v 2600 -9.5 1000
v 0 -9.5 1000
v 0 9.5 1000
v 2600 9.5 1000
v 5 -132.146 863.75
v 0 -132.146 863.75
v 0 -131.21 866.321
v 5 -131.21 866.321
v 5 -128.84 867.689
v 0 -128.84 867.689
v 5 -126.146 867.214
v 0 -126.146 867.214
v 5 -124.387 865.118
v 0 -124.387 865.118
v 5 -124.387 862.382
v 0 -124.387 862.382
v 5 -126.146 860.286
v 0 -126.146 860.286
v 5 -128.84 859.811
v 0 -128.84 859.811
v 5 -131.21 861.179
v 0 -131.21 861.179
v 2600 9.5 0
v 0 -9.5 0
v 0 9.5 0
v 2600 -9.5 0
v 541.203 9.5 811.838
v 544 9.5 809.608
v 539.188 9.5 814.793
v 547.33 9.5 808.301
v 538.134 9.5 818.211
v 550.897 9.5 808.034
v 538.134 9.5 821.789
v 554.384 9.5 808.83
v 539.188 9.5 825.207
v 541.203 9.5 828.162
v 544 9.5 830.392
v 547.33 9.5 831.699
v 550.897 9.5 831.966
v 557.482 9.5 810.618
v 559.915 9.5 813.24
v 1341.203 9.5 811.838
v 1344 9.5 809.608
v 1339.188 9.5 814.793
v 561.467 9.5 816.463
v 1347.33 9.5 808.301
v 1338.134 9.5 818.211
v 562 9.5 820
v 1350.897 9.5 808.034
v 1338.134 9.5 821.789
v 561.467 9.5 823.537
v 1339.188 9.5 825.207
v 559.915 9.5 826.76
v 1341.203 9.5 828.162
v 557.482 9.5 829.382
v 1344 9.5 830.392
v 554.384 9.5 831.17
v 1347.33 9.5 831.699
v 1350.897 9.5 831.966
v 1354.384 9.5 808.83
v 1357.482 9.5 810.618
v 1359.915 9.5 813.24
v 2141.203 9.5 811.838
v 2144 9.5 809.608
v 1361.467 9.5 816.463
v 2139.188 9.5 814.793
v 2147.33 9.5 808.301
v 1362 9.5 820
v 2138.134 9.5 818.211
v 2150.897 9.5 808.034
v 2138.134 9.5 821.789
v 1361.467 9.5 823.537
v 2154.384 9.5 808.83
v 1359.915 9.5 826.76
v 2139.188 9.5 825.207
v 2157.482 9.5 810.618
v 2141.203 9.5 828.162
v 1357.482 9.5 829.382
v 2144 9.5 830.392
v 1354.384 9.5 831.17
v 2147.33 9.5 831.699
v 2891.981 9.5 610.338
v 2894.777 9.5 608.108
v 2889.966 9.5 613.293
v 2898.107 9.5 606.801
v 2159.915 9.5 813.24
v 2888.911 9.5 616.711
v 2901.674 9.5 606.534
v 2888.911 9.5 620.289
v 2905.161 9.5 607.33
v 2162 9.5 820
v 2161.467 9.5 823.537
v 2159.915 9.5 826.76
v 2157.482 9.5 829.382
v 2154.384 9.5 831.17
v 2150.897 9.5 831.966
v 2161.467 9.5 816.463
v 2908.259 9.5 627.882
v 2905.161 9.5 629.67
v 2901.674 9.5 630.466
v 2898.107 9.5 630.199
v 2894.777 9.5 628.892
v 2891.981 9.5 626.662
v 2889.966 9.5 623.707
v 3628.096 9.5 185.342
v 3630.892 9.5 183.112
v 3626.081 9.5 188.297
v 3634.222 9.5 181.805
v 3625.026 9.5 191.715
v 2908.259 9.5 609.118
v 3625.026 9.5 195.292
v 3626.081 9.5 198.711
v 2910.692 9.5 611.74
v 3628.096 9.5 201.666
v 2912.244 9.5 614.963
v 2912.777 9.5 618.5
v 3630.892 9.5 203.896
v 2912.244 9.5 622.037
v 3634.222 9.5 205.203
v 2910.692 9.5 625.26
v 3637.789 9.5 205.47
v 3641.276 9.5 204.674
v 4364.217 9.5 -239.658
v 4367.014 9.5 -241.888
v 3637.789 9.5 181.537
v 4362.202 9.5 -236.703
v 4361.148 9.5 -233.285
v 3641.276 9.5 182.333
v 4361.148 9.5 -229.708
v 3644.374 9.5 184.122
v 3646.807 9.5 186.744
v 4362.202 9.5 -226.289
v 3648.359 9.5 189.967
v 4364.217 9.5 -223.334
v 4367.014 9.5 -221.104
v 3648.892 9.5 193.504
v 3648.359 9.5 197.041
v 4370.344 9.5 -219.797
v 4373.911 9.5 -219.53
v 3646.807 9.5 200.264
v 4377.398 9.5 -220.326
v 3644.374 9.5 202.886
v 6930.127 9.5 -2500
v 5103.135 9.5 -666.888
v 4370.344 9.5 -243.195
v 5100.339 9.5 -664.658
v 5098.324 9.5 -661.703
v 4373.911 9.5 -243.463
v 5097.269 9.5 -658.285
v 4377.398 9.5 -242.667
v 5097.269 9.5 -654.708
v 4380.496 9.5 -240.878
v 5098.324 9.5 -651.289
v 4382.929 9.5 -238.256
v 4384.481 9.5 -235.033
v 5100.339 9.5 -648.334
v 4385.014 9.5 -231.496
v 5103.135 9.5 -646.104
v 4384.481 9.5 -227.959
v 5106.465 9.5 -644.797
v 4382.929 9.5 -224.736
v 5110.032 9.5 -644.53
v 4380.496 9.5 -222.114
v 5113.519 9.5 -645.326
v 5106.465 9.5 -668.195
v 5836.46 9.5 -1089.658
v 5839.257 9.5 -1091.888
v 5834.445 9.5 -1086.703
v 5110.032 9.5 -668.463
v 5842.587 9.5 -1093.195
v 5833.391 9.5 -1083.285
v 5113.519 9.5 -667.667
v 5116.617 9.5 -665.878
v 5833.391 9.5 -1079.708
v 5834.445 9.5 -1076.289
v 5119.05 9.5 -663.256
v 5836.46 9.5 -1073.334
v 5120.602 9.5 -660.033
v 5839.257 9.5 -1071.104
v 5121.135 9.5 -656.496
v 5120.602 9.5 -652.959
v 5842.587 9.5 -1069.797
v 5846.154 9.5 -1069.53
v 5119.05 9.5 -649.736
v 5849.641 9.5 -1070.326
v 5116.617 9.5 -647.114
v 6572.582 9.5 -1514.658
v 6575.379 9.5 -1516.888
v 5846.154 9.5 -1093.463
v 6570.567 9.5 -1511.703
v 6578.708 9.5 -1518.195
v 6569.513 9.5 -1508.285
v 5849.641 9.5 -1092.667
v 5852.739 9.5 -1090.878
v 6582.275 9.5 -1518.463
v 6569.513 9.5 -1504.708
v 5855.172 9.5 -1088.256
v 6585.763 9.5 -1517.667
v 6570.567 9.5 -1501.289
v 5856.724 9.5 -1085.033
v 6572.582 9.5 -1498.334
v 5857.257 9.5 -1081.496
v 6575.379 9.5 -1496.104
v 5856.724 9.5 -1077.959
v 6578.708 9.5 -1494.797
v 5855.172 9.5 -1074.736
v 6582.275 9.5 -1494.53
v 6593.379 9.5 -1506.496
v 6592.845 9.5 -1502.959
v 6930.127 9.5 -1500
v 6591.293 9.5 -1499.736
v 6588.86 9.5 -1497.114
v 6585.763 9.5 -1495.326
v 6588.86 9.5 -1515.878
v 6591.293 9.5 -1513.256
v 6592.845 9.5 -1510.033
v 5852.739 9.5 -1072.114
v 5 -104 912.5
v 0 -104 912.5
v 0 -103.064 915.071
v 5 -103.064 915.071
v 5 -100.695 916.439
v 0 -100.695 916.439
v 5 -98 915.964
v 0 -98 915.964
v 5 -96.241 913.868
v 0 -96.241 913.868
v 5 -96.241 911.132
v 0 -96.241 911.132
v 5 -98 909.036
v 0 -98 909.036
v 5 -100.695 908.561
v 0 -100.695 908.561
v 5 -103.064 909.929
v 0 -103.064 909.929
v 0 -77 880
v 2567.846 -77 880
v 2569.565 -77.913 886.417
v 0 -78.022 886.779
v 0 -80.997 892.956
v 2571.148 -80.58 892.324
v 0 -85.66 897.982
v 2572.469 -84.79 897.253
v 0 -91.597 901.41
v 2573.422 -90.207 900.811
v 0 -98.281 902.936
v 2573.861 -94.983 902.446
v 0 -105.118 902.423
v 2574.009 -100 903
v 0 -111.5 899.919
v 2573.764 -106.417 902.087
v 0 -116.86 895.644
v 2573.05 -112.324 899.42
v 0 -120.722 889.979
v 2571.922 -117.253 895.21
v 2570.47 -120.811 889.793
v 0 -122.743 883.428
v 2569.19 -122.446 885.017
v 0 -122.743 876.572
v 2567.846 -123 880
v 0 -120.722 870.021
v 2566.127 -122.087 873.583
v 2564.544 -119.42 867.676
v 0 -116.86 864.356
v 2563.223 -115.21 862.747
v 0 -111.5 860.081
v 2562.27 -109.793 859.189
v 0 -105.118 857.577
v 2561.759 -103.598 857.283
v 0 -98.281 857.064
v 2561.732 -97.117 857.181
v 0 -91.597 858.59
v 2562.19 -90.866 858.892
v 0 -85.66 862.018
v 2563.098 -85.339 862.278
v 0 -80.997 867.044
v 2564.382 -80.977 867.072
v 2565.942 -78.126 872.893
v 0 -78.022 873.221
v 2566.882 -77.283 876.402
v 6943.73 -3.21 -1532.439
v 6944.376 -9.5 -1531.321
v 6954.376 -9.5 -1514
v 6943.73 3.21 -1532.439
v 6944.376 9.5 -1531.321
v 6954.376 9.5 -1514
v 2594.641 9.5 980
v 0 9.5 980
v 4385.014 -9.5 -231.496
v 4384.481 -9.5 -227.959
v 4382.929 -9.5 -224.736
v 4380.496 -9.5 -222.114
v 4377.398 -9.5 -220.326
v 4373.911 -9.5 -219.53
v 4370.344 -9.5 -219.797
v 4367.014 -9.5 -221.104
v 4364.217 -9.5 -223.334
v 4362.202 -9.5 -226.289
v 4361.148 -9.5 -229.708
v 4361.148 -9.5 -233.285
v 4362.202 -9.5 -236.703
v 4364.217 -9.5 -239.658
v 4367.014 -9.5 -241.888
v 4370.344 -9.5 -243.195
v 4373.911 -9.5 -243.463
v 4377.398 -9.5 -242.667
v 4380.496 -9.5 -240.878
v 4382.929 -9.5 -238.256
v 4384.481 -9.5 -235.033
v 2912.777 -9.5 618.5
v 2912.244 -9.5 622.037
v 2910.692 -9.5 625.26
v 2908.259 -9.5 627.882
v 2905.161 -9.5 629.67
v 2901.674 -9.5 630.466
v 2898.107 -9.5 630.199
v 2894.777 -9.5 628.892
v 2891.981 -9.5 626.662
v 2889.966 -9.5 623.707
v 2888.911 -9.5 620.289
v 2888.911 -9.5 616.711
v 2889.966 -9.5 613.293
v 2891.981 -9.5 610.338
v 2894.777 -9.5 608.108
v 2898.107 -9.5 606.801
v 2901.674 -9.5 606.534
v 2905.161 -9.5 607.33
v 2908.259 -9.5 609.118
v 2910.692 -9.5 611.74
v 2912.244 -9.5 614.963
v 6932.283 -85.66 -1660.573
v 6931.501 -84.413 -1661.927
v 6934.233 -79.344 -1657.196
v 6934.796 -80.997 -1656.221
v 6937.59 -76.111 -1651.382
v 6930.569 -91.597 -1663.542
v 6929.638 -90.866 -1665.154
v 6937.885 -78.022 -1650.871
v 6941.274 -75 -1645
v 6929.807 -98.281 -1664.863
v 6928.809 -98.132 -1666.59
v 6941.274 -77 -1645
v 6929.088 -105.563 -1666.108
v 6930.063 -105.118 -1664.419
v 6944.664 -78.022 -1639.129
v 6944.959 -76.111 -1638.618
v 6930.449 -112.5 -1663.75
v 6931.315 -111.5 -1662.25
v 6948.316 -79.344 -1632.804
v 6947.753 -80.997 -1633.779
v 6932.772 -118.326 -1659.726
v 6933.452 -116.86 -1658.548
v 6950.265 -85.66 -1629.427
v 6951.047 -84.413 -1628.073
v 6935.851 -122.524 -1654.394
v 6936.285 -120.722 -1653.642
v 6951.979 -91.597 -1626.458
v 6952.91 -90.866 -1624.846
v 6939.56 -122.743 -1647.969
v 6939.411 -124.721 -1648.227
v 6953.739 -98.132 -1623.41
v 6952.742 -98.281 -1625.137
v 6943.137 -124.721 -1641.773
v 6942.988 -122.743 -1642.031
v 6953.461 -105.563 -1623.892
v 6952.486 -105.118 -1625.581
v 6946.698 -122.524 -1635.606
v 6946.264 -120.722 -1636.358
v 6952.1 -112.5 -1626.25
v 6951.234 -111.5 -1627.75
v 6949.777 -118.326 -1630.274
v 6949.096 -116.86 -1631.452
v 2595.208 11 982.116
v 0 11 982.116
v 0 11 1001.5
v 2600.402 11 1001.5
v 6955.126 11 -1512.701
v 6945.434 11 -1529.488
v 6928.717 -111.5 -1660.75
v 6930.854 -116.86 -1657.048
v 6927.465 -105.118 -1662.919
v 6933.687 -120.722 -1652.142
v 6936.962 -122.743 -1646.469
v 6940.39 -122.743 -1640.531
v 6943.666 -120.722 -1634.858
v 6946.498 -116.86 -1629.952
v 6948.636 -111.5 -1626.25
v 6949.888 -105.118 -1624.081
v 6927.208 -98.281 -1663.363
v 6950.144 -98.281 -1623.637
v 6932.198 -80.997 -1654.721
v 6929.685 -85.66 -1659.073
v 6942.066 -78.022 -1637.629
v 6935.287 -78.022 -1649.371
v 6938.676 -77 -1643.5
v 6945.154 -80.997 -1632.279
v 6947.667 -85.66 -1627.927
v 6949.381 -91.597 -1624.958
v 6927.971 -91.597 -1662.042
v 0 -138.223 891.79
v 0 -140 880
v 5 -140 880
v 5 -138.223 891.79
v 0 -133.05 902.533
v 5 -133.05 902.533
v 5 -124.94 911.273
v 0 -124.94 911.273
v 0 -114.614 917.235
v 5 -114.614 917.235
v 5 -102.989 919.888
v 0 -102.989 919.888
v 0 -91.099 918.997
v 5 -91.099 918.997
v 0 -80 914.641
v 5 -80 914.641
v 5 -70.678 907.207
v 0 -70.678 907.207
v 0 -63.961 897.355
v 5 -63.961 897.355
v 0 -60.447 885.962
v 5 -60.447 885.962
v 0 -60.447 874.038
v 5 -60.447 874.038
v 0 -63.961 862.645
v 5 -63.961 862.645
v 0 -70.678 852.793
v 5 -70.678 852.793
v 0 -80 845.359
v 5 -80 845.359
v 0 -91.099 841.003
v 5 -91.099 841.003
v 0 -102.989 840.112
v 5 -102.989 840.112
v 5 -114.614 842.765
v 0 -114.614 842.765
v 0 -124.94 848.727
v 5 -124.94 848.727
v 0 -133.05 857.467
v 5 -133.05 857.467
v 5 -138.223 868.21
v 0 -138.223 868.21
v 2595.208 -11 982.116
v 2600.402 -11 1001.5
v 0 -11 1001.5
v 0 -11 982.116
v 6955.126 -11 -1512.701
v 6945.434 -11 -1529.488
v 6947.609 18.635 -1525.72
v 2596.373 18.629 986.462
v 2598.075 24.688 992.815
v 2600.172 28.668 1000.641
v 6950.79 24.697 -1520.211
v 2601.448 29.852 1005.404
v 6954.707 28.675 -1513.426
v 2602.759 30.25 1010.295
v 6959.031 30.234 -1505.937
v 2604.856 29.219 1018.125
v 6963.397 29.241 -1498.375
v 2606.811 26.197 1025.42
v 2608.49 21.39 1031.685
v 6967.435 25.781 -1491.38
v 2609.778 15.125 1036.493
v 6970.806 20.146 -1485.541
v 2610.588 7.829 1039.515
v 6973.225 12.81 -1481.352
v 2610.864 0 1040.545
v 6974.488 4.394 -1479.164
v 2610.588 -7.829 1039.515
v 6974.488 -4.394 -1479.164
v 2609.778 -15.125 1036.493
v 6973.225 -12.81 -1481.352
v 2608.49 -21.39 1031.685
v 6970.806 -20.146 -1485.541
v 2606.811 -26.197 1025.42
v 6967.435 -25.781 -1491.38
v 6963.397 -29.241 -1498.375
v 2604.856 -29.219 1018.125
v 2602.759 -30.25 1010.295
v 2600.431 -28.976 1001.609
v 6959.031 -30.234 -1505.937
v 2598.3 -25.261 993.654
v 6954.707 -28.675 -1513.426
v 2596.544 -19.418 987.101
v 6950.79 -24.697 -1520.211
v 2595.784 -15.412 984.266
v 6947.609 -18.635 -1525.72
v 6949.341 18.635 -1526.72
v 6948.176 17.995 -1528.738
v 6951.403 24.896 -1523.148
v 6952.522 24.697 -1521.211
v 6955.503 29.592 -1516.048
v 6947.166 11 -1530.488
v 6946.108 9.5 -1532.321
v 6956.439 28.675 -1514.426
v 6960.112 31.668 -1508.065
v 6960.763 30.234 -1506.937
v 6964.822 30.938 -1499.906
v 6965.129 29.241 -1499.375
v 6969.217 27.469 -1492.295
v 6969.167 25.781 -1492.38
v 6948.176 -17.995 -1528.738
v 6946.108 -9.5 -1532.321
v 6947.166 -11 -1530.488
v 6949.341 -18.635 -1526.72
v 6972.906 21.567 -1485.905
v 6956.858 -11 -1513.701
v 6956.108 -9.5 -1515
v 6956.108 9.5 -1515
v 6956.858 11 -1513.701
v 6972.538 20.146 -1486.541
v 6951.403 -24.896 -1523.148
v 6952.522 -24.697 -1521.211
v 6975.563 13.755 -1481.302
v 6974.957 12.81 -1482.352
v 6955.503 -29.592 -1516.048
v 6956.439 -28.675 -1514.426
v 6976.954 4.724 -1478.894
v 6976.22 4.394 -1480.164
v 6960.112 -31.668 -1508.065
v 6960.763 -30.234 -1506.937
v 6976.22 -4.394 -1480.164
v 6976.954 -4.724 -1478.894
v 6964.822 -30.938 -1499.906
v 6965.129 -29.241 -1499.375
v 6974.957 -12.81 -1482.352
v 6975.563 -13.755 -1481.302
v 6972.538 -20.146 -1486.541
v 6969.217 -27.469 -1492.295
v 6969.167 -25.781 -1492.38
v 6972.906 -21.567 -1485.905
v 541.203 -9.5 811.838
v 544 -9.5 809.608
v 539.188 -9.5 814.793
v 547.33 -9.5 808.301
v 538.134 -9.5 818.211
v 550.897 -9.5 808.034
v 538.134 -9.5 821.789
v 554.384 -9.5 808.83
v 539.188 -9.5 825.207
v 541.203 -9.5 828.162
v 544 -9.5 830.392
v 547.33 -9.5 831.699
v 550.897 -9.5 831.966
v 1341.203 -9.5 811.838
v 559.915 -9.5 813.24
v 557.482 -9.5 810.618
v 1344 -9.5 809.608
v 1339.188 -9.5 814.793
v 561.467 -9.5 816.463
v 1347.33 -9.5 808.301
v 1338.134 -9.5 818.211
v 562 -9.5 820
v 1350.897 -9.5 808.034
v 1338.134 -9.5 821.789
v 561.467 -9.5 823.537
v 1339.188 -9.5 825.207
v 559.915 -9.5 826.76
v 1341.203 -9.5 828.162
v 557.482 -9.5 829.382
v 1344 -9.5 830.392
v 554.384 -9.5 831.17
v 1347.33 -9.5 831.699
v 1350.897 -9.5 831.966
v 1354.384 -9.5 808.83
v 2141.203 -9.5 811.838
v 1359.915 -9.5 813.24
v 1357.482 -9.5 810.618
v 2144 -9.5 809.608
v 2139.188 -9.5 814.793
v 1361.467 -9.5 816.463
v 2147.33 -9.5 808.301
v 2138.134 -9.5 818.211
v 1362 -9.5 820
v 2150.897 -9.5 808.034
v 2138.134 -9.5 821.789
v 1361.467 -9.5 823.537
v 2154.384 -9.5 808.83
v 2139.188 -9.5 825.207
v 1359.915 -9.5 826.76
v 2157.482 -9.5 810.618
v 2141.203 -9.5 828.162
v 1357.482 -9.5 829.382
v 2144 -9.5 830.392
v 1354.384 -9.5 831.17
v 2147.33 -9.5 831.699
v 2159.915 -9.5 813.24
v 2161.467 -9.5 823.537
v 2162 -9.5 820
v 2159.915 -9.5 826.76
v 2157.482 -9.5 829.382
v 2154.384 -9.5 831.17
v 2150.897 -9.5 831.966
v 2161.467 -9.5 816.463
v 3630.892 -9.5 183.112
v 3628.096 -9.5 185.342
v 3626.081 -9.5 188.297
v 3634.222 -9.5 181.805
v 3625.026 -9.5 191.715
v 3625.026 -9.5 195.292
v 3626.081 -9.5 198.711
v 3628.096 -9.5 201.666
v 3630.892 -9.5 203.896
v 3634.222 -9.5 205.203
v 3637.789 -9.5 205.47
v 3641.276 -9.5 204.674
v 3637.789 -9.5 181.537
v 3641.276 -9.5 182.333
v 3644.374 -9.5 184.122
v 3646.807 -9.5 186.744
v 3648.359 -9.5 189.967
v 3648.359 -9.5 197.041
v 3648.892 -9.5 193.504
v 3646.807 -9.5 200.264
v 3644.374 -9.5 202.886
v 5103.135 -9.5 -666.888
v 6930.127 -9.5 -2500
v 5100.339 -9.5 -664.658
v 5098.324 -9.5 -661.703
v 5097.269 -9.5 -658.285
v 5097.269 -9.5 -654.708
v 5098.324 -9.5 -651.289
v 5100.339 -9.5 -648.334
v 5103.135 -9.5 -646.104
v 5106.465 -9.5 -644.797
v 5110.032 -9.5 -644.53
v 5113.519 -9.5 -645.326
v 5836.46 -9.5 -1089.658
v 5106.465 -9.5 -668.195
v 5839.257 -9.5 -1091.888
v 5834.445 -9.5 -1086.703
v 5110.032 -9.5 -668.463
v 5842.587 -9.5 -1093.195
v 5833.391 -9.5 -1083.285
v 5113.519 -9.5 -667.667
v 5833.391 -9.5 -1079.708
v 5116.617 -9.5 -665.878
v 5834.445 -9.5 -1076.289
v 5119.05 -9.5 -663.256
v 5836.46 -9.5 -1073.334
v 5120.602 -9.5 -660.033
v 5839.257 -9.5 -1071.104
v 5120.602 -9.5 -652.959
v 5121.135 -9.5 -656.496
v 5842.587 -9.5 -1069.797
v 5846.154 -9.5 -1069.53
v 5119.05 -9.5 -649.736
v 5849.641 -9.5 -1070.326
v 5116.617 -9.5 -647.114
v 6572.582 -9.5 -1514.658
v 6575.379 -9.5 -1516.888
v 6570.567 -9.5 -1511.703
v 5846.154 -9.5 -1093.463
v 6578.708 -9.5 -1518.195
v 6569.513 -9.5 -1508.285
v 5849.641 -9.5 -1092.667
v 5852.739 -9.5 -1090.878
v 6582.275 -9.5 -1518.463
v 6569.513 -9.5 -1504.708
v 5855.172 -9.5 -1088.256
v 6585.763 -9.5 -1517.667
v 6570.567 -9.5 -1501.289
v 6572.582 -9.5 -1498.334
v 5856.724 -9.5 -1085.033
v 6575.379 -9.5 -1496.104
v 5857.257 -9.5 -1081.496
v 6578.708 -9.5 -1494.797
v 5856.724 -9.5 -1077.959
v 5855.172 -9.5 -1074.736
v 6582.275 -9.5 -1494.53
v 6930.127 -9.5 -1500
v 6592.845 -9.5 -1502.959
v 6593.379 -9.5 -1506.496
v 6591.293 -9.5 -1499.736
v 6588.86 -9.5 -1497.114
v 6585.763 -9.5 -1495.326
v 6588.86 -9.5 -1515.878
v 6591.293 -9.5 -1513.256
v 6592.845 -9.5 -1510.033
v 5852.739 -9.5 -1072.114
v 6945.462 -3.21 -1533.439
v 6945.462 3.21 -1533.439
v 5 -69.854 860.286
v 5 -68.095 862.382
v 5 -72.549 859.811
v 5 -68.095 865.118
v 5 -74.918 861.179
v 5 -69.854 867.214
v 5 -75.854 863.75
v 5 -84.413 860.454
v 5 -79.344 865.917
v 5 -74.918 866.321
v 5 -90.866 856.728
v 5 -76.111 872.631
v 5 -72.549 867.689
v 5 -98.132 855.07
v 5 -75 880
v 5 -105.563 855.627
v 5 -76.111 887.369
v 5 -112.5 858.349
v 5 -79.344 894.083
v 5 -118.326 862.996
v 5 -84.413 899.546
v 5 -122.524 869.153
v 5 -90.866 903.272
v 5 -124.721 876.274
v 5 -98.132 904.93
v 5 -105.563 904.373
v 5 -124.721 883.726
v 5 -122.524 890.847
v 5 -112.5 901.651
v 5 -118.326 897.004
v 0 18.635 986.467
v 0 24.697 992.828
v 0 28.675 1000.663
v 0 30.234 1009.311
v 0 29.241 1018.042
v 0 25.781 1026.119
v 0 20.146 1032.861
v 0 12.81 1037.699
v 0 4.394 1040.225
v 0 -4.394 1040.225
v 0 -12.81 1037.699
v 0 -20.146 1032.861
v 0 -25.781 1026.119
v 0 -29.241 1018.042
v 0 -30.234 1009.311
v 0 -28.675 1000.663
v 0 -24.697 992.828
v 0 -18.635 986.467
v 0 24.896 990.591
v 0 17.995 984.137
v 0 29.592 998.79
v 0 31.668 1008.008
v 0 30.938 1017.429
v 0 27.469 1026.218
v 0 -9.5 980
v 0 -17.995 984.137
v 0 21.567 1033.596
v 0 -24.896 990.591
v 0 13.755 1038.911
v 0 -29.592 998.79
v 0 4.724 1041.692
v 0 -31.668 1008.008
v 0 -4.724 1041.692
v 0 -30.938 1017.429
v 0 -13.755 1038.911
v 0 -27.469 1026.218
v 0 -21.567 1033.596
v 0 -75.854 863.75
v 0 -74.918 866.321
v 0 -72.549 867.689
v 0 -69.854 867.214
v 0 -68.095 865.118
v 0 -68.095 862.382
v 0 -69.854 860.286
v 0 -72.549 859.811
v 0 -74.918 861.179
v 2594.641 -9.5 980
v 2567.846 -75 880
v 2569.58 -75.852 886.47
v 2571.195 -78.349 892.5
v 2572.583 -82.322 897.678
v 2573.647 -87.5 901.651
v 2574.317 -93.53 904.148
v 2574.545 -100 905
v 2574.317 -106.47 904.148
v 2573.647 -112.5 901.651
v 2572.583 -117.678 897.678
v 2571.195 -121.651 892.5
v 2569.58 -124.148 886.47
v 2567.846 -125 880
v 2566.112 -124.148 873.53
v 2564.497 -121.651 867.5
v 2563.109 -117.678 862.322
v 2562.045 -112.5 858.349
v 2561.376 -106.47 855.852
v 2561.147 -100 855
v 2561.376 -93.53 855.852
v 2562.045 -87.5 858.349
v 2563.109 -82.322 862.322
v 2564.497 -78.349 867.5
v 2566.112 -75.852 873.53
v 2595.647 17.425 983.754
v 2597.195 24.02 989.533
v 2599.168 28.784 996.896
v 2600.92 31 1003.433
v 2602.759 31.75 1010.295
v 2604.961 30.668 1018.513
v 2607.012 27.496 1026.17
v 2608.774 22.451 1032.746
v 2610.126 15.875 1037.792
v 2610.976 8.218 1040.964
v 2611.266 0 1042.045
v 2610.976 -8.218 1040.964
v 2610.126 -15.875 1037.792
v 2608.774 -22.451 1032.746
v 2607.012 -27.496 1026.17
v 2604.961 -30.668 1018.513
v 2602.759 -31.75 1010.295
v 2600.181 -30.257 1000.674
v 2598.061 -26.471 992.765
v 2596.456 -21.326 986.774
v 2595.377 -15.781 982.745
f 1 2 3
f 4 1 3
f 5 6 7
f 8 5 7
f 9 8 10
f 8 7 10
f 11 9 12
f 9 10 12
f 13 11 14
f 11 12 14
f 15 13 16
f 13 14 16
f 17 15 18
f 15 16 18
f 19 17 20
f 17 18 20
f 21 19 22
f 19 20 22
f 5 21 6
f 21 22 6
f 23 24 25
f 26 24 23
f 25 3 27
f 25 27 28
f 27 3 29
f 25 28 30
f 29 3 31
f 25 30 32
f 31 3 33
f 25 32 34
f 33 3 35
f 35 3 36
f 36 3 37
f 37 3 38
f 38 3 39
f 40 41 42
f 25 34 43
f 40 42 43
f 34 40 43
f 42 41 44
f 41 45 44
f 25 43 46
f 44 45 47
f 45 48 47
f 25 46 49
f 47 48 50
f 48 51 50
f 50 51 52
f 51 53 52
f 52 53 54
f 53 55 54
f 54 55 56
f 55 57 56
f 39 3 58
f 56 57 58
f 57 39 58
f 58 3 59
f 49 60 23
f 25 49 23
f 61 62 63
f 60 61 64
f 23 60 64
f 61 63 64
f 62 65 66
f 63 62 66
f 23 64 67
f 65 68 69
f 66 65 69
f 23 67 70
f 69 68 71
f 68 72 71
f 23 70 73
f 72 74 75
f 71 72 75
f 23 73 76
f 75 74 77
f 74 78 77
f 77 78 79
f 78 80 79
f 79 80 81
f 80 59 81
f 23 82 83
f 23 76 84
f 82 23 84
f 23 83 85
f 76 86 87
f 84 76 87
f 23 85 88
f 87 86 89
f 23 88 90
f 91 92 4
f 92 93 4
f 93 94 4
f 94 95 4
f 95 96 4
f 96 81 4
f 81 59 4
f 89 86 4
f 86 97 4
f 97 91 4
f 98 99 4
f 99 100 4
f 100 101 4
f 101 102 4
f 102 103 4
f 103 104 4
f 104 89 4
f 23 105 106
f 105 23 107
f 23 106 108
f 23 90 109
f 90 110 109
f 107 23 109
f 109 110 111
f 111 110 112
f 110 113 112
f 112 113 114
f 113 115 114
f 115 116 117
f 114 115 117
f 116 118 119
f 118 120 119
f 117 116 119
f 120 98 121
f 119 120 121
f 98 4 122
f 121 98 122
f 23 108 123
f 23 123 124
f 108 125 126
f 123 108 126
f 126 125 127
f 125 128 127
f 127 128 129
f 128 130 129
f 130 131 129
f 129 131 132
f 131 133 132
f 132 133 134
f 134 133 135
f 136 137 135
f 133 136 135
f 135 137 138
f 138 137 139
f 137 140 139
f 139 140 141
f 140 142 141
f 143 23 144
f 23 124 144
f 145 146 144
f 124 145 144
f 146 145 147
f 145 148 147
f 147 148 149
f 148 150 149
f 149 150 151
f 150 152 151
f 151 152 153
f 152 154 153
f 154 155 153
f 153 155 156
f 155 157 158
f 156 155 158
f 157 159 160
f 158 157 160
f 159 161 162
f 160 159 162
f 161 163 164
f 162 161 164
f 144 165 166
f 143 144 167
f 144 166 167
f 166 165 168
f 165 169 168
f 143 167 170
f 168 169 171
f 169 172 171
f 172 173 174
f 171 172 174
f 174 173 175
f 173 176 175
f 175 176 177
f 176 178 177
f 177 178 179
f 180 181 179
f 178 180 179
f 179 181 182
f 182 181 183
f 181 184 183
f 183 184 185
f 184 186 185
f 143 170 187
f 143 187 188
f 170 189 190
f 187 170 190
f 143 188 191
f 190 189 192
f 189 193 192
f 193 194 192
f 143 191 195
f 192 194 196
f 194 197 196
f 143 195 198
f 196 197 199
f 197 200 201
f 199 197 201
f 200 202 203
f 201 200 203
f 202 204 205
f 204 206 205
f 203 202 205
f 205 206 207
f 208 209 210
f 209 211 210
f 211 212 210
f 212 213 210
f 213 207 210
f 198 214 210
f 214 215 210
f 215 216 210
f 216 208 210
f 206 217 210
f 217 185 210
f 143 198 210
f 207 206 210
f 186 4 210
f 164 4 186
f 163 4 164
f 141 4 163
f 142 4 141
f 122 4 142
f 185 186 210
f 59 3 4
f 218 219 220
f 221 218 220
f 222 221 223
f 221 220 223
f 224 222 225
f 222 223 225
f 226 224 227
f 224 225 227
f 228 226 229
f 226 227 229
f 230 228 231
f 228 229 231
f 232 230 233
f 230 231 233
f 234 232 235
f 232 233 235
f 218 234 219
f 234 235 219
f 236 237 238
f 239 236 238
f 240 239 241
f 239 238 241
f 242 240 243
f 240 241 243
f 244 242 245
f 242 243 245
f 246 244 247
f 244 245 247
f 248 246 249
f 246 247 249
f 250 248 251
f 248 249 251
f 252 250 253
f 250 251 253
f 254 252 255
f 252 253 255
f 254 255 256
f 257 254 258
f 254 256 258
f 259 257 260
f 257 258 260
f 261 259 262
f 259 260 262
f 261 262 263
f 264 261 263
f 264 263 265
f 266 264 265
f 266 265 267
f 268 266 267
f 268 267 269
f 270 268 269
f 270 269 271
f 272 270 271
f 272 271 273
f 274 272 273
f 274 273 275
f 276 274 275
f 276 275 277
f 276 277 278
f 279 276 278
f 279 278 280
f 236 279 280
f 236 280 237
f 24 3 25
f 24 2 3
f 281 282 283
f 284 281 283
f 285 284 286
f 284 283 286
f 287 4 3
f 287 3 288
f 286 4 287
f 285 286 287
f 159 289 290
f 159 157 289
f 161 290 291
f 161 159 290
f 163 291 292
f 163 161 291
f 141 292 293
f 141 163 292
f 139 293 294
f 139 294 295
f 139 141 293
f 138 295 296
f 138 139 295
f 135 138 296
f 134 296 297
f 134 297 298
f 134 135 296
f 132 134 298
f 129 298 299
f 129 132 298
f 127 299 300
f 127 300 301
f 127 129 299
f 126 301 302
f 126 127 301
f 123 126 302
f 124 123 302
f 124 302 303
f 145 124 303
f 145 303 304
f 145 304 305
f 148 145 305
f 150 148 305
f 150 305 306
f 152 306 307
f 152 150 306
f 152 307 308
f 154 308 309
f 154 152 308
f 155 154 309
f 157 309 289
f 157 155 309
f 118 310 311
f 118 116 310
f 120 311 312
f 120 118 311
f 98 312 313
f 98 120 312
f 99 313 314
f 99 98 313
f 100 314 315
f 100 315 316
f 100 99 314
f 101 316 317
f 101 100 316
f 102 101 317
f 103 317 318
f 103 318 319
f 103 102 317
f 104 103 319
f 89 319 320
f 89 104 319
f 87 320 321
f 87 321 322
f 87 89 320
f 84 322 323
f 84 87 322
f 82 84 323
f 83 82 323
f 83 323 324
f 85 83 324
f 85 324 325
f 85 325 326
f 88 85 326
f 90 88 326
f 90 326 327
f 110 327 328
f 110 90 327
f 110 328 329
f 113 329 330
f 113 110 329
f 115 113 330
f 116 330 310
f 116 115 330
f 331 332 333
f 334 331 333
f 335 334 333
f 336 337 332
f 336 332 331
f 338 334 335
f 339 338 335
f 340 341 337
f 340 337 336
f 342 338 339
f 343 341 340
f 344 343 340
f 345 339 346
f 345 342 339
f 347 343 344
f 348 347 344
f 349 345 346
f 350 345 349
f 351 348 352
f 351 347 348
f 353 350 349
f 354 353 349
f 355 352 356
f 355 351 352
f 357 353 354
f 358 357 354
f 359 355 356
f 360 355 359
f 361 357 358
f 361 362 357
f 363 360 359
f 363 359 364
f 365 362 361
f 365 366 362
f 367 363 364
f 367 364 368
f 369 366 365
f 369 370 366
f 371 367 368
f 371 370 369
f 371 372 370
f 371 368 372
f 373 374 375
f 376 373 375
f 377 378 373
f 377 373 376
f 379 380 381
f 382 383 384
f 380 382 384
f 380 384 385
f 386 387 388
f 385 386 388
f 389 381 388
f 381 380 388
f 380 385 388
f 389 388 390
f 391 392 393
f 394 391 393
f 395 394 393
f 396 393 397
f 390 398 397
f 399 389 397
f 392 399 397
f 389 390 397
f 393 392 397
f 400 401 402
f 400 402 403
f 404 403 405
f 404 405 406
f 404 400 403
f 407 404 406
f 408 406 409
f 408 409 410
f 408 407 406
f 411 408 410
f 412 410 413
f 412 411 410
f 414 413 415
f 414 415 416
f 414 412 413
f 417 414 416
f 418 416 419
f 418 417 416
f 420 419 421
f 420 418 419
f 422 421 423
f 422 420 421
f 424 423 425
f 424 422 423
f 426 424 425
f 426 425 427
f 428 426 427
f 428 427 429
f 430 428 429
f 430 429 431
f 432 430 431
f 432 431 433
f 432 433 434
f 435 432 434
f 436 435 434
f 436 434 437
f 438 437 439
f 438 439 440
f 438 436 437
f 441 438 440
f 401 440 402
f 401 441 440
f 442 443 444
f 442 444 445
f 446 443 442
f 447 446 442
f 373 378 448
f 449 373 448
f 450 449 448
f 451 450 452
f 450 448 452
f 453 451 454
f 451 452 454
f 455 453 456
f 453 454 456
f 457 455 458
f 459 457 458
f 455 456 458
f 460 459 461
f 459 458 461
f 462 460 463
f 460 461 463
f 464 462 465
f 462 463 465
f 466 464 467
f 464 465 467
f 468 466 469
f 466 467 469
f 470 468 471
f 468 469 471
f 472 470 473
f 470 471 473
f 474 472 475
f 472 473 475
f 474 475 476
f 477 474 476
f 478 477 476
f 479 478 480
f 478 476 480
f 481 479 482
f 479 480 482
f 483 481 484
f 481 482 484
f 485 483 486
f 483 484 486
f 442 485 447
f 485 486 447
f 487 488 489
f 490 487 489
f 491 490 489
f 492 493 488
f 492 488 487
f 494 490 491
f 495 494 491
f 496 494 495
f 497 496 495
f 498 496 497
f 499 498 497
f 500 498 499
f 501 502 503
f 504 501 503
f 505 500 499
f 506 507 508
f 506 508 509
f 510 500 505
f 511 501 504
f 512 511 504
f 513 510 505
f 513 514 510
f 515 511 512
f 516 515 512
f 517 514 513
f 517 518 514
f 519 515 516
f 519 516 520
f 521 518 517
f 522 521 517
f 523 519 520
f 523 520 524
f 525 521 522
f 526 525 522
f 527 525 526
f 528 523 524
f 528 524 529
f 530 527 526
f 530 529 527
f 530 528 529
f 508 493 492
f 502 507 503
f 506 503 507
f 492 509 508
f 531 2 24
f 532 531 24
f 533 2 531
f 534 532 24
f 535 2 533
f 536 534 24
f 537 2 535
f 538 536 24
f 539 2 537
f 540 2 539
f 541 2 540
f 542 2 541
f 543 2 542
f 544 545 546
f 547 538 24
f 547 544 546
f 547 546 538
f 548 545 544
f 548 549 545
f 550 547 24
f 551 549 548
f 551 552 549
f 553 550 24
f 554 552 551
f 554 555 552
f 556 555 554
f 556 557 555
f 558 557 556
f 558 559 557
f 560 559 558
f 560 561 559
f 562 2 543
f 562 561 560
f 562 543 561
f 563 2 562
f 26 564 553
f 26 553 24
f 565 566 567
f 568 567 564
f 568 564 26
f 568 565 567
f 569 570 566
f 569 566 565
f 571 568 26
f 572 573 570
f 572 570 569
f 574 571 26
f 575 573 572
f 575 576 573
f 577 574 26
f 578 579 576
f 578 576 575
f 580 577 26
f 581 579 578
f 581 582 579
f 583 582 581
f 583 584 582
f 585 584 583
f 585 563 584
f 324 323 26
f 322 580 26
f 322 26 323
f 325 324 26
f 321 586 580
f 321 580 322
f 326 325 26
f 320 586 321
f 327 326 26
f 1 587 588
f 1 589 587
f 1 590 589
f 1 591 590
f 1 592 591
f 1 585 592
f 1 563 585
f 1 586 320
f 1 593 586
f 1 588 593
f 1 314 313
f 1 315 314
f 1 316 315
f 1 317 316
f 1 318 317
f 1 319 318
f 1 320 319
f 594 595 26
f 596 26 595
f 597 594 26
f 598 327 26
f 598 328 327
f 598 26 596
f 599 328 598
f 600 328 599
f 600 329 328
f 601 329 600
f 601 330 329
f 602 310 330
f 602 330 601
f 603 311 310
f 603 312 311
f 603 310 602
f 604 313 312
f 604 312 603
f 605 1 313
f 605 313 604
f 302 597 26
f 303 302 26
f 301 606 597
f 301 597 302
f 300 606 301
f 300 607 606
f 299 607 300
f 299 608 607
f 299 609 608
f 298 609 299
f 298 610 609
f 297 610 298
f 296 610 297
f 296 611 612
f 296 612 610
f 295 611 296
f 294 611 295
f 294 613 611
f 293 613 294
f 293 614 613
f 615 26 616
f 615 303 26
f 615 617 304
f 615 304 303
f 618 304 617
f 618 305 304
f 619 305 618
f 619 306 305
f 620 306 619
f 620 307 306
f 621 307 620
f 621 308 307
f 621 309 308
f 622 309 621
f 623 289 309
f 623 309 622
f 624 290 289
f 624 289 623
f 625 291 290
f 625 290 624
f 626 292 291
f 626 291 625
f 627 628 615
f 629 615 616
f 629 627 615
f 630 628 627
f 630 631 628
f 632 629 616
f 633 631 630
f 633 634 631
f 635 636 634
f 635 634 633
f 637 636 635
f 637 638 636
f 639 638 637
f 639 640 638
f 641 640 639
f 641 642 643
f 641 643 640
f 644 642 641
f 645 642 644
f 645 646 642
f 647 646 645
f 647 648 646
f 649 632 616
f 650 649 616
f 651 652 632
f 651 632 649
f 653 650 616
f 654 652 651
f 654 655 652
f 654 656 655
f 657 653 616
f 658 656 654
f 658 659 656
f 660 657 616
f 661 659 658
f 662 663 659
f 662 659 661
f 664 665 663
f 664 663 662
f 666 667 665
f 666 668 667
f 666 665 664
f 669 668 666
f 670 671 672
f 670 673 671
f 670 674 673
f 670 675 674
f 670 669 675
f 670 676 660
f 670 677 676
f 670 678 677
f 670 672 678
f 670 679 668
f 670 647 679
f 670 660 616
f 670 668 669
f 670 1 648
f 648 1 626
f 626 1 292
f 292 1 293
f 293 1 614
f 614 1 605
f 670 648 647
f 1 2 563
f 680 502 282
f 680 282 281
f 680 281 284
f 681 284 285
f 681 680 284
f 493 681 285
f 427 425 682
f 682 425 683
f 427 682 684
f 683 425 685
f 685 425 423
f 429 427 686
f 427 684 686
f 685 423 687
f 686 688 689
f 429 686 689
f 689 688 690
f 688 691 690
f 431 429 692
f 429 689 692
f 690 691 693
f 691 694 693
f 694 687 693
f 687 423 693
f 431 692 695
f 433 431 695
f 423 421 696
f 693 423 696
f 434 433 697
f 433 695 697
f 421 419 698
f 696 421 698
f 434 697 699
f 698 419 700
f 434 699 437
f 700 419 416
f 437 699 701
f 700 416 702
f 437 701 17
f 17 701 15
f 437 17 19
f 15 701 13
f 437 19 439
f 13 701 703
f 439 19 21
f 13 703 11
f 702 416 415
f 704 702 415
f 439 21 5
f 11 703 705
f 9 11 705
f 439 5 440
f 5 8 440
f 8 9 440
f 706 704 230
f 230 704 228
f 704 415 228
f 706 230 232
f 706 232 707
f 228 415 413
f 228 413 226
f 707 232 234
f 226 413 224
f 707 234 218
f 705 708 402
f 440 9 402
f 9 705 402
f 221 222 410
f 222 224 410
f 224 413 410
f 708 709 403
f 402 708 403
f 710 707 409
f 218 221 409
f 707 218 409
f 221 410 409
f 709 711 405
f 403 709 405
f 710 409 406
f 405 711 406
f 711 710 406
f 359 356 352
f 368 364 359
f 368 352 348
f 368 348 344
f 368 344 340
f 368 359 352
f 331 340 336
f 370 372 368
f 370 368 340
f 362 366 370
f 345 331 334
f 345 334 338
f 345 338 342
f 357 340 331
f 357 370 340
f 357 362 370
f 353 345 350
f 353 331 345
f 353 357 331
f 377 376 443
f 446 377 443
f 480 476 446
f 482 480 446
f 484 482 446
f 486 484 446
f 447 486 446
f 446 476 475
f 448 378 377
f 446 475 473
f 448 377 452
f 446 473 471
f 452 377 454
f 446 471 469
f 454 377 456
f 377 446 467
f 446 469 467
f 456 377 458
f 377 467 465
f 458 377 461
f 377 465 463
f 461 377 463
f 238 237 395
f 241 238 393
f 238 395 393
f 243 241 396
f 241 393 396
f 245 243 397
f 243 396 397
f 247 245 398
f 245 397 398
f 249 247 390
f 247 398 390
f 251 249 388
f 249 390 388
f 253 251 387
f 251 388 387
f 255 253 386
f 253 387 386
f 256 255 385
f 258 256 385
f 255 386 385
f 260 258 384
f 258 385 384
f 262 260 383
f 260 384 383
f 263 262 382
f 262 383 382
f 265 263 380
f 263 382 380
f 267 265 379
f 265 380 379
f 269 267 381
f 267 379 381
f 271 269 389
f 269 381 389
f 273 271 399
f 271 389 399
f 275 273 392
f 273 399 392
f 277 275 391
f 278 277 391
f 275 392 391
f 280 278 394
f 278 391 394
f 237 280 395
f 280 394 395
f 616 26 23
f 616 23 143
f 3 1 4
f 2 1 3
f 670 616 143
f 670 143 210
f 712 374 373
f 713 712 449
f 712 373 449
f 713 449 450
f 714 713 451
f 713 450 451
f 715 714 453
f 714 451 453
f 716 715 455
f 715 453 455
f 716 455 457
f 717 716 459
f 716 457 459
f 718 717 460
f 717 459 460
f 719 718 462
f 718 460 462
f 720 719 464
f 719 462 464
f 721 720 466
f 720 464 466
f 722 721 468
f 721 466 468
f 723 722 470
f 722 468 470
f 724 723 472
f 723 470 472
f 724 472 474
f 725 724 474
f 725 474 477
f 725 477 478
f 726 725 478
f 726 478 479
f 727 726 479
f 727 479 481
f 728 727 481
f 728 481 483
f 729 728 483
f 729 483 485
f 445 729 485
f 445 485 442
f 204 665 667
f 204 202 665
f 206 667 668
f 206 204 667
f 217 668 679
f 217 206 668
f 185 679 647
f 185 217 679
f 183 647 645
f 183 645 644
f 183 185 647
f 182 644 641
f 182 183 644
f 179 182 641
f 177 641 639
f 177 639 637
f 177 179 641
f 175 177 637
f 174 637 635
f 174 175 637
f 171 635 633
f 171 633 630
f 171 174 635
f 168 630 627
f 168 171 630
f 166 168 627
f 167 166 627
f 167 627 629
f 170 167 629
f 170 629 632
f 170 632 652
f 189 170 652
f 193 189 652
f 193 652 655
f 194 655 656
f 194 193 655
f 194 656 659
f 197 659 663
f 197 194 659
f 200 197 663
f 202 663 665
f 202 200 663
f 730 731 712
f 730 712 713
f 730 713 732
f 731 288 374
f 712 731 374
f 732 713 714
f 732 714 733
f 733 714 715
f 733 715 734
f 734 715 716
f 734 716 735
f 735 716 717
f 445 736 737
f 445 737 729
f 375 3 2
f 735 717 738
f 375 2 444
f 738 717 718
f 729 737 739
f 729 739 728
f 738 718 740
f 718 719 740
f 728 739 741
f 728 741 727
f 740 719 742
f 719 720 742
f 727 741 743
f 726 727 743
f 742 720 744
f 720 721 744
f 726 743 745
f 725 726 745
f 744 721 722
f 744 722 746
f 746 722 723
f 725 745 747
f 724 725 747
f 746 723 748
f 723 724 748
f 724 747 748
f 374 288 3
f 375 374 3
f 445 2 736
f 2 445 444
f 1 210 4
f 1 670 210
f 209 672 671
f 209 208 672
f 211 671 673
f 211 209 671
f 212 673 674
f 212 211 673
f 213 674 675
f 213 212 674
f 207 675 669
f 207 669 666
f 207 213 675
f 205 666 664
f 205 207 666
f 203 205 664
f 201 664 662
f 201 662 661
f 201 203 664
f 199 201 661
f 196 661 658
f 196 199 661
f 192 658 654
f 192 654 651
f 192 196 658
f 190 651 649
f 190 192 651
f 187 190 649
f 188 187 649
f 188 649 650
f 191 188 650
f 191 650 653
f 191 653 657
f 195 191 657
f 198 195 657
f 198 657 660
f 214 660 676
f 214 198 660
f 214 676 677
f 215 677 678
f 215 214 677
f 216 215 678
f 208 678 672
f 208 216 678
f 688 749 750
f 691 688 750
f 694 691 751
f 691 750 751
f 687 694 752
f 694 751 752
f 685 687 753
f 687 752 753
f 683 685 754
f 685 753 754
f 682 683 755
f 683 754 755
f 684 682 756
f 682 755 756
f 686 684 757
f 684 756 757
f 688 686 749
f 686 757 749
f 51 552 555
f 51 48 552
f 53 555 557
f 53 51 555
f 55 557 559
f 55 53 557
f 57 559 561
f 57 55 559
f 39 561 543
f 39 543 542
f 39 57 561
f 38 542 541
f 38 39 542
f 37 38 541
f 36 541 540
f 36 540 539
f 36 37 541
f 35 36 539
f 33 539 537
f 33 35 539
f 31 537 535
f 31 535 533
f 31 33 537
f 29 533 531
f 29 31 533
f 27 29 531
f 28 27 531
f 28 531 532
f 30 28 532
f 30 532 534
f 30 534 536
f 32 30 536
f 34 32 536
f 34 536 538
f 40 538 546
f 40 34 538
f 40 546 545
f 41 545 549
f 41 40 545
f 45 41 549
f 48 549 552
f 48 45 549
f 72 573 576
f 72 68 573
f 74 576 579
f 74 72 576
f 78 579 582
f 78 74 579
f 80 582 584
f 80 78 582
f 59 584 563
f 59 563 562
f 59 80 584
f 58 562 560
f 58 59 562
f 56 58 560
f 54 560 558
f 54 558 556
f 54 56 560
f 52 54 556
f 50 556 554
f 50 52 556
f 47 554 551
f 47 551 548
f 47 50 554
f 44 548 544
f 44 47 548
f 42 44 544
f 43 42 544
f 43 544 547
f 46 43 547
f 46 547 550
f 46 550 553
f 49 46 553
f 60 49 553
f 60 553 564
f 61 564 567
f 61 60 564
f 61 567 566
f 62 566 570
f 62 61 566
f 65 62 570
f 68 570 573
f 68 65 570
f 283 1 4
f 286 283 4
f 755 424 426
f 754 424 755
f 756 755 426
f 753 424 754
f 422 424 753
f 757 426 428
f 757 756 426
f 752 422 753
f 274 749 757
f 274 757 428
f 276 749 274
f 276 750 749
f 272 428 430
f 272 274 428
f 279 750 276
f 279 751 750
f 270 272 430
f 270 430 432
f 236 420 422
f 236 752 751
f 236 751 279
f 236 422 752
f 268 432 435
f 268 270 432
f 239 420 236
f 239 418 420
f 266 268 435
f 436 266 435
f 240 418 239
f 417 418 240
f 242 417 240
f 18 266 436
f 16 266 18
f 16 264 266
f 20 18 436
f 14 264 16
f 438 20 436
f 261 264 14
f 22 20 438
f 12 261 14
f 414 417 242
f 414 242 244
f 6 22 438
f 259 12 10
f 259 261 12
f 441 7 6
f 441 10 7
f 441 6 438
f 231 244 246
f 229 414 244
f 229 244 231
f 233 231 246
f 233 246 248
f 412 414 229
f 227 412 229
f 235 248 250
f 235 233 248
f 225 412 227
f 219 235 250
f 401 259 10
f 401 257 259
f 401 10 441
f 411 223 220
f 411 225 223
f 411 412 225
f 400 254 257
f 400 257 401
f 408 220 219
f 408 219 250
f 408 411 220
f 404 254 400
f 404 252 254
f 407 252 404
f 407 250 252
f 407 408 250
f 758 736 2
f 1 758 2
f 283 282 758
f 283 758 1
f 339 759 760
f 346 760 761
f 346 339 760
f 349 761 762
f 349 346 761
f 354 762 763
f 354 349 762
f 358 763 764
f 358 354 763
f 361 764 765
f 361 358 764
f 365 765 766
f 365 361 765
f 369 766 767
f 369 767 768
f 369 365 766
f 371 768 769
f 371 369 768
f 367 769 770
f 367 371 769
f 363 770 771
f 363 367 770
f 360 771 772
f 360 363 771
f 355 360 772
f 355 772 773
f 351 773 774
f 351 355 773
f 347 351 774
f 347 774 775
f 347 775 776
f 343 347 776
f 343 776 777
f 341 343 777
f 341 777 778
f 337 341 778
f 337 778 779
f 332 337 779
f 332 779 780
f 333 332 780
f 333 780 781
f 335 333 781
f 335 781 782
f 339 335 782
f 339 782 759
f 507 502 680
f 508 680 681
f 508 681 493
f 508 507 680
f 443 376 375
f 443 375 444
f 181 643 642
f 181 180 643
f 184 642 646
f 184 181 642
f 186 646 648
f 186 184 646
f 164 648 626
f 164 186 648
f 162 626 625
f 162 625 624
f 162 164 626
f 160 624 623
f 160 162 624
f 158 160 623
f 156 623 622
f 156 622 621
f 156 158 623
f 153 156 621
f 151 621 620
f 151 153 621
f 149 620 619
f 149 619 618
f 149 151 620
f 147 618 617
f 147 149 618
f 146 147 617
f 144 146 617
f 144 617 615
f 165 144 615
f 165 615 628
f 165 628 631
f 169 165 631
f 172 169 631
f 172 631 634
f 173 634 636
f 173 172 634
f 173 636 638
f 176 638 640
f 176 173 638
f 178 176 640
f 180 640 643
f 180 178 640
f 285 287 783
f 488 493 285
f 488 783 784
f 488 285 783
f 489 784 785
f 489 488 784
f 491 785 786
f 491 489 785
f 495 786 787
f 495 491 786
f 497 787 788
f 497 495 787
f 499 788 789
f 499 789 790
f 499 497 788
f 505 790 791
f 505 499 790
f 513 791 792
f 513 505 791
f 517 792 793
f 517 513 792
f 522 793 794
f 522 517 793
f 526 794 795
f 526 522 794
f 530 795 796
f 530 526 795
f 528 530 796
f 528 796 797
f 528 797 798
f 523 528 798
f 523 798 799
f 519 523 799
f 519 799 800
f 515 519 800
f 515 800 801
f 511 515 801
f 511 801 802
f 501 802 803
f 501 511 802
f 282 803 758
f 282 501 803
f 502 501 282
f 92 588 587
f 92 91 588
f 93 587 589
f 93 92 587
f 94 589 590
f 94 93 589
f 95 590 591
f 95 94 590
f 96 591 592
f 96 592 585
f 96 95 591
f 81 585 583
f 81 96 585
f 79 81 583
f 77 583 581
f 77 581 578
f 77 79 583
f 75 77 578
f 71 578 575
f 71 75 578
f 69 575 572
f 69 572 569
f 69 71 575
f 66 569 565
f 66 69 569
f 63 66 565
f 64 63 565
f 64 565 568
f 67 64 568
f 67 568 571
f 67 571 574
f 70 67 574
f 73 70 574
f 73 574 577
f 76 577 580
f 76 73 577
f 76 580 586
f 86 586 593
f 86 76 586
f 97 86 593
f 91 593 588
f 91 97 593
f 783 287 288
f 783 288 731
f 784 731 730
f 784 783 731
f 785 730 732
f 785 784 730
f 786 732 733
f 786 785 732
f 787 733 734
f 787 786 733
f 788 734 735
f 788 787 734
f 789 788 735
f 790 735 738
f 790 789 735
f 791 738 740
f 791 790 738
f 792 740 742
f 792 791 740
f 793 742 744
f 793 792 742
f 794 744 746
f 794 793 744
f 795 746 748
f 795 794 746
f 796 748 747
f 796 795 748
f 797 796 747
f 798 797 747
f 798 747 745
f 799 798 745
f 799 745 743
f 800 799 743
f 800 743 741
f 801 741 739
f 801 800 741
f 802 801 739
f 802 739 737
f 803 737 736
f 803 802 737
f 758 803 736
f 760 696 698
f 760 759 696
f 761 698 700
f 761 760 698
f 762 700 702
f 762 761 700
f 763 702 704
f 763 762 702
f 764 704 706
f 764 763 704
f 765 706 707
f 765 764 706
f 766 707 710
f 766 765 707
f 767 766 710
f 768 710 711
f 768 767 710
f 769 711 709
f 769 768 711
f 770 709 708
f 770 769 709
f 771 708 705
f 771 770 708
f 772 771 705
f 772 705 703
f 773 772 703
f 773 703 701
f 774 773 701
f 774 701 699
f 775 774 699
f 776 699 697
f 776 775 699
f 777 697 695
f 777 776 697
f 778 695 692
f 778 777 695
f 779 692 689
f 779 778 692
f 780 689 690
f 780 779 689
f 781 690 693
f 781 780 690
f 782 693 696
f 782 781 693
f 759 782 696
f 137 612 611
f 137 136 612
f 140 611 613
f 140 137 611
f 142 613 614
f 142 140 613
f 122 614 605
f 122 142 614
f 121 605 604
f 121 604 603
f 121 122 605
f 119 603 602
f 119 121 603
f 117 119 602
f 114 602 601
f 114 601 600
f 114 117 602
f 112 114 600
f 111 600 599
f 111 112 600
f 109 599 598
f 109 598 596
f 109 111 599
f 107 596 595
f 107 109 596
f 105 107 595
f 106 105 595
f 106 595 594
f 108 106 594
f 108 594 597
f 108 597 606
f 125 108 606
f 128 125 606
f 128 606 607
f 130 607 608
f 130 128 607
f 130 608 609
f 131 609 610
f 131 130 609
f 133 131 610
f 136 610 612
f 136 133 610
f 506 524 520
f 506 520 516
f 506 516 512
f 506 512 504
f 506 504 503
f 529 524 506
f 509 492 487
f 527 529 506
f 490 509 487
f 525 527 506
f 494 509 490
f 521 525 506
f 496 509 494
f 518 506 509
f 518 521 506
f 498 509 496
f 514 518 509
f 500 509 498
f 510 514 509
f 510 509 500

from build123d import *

# Parameters (mm, degrees)
F0_R      = 12
F1_DEPTH  = 9.5
F5_R      = 31.75
F6_DEPTH  = 2
F9_R      = 25
F9_R_2    = 23
F12_R     = 25
F13_DEPTH = 3
F14_R     = 40
F14_R_2   = 4
F14_R_3   = 25
F15_DEPTH = 5


with BuildPart() as f1:
    # F0 (on Front) → F1 (new body, symmetric)
    with BuildSketch(Plane.XZ):
        Polygon((0, 1000), (0, 0), (2600, 0), (6930.1270189222, -2500), (6930.1270189222, -1500), (2600, 1000), align=None)
        with Locations((6581.3785888182, -1506.4960969083)):
            Circle(F0_R, mode=Mode.SUBTRACT)
        with Locations((5845.2569956014, -1081.4960969083)):
            Circle(F0_R, mode=Mode.SUBTRACT)
        with Locations((550, 820)):
            Circle(F0_R, mode=Mode.SUBTRACT)
        with Locations((1350, 820)):
            Circle(F0_R, mode=Mode.SUBTRACT)
        with Locations((2150, 820)):
            Circle(F0_R, mode=Mode.SUBTRACT)
        with Locations((2900.7773830875, 618.5)):
            Circle(F0_R, mode=Mode.SUBTRACT)
        with Locations((5109.1354023847, -656.4960969083)):
            Circle(F0_R, mode=Mode.SUBTRACT)
        with Locations((4373.0138091679, -231.4960969083)):
            Circle(F0_R, mode=Mode.SUBTRACT)
        with Locations((3636.8922159511, 193.5039030917)):
            Circle(F0_R, mode=Mode.SUBTRACT)
    extrude(amount=F1_DEPTH, both=True)


with BuildPart() as f4:
    # F4: sweep along a path in F2
    with BuildLine(Plane.XZ) as f4_path:
        Line((0, 1000), (2600, 1000))
        Line((2600, 1000), (6956.1077810357, -1515))
    # F3 (on Right) → F4 (sweep)
    with BuildSketch(Plane.YZ):
        with BuildLine():
            Line((9.5, 1000), (9.5, 980))
            ThreePointArc((9.5, 980), (0, 1042.045420446), (-9.5, 980))
            Line((-9.5, 980), (-9.5, 1000))
            Line((-9.5, 1000), (9.5, 1000))
        make_face()
        with BuildLine():
            ThreePointArc((-11, 982.1163058396), (0, 1040.545420446), (11, 982.1163058396))
            Line((11, 982.1163058396), (11, 1001.5))
            Line((11, 1001.5), (-11, 1001.5))
            Line((-11, 1001.5), (-11, 982.1163058396))
        make_face(mode=Mode.SUBTRACT)
    sweep(path=f4_path.line, transition=Transition.RIGHT)

    # F5 (on face) → F6 (join)
    with BuildSketch(Plane(origin=(5873.0950791435, 0, -3390.8330249198), x_dir=(0, 1, 0), z_dir=(0.8660254038, 0, -0.5))):
        with Locations((0, 2176.3208242304)):
            Circle(F5_R)
    extrude(amount=-F6_DEPTH)


with BuildPart() as f10:
    # F10: sweep along a path in F8
    with BuildLine(Plane.XZ.offset(100)) as f10_path:
        Line((0, 880), (2567.8460969083, 880))
        Line((2567.8460969083, 880), (6941.2743860197, -1645))
    # F9 (on Right) → F10 (sweep)
    with BuildSketch(Plane.YZ):
        with Locations((-100, 880)):
            Circle(F9_R)
        with Locations((-100, 880)):
            Circle(F9_R_2, mode=Mode.SUBTRACT)
    sweep(path=f10_path.line, transition=Transition.RIGHT)

    # F12 (on face) → F13 (join)
    with BuildSketch(Plane(origin=(5918.2616841275, 0, -3416.9099764656), x_dir=(0, 1, 0), z_dir=(0.8660254038, 0, -0.5))):
        with Locations((-100, 2046.0254037844)):
            Circle(F12_R)
    extrude(amount=-F13_DEPTH)

    # F14 (on face) → F15 (join)
    with BuildSketch(Plane(origin=(0, 0, 0), x_dir=(0, -1, 0), z_dir=(-1, 0, 0))):
        with Locations((100, 880)):
            Circle(F14_R)
        with Locations((71.854174377, 863.75)):
            Circle(F14_R_2, mode=Mode.SUBTRACT)
        with Locations((128.145825623, 863.75)):
            Circle(F14_R_2, mode=Mode.SUBTRACT)
        with Locations((100, 880)):
            Circle(F14_R_3, mode=Mode.SUBTRACT)
        with Locations((100, 912.5)):
            Circle(F14_R_2, mode=Mode.SUBTRACT)
    extrude(amount=-F15_DEPTH)


solid = Compound([f1.part, f4.part, f10.part])
